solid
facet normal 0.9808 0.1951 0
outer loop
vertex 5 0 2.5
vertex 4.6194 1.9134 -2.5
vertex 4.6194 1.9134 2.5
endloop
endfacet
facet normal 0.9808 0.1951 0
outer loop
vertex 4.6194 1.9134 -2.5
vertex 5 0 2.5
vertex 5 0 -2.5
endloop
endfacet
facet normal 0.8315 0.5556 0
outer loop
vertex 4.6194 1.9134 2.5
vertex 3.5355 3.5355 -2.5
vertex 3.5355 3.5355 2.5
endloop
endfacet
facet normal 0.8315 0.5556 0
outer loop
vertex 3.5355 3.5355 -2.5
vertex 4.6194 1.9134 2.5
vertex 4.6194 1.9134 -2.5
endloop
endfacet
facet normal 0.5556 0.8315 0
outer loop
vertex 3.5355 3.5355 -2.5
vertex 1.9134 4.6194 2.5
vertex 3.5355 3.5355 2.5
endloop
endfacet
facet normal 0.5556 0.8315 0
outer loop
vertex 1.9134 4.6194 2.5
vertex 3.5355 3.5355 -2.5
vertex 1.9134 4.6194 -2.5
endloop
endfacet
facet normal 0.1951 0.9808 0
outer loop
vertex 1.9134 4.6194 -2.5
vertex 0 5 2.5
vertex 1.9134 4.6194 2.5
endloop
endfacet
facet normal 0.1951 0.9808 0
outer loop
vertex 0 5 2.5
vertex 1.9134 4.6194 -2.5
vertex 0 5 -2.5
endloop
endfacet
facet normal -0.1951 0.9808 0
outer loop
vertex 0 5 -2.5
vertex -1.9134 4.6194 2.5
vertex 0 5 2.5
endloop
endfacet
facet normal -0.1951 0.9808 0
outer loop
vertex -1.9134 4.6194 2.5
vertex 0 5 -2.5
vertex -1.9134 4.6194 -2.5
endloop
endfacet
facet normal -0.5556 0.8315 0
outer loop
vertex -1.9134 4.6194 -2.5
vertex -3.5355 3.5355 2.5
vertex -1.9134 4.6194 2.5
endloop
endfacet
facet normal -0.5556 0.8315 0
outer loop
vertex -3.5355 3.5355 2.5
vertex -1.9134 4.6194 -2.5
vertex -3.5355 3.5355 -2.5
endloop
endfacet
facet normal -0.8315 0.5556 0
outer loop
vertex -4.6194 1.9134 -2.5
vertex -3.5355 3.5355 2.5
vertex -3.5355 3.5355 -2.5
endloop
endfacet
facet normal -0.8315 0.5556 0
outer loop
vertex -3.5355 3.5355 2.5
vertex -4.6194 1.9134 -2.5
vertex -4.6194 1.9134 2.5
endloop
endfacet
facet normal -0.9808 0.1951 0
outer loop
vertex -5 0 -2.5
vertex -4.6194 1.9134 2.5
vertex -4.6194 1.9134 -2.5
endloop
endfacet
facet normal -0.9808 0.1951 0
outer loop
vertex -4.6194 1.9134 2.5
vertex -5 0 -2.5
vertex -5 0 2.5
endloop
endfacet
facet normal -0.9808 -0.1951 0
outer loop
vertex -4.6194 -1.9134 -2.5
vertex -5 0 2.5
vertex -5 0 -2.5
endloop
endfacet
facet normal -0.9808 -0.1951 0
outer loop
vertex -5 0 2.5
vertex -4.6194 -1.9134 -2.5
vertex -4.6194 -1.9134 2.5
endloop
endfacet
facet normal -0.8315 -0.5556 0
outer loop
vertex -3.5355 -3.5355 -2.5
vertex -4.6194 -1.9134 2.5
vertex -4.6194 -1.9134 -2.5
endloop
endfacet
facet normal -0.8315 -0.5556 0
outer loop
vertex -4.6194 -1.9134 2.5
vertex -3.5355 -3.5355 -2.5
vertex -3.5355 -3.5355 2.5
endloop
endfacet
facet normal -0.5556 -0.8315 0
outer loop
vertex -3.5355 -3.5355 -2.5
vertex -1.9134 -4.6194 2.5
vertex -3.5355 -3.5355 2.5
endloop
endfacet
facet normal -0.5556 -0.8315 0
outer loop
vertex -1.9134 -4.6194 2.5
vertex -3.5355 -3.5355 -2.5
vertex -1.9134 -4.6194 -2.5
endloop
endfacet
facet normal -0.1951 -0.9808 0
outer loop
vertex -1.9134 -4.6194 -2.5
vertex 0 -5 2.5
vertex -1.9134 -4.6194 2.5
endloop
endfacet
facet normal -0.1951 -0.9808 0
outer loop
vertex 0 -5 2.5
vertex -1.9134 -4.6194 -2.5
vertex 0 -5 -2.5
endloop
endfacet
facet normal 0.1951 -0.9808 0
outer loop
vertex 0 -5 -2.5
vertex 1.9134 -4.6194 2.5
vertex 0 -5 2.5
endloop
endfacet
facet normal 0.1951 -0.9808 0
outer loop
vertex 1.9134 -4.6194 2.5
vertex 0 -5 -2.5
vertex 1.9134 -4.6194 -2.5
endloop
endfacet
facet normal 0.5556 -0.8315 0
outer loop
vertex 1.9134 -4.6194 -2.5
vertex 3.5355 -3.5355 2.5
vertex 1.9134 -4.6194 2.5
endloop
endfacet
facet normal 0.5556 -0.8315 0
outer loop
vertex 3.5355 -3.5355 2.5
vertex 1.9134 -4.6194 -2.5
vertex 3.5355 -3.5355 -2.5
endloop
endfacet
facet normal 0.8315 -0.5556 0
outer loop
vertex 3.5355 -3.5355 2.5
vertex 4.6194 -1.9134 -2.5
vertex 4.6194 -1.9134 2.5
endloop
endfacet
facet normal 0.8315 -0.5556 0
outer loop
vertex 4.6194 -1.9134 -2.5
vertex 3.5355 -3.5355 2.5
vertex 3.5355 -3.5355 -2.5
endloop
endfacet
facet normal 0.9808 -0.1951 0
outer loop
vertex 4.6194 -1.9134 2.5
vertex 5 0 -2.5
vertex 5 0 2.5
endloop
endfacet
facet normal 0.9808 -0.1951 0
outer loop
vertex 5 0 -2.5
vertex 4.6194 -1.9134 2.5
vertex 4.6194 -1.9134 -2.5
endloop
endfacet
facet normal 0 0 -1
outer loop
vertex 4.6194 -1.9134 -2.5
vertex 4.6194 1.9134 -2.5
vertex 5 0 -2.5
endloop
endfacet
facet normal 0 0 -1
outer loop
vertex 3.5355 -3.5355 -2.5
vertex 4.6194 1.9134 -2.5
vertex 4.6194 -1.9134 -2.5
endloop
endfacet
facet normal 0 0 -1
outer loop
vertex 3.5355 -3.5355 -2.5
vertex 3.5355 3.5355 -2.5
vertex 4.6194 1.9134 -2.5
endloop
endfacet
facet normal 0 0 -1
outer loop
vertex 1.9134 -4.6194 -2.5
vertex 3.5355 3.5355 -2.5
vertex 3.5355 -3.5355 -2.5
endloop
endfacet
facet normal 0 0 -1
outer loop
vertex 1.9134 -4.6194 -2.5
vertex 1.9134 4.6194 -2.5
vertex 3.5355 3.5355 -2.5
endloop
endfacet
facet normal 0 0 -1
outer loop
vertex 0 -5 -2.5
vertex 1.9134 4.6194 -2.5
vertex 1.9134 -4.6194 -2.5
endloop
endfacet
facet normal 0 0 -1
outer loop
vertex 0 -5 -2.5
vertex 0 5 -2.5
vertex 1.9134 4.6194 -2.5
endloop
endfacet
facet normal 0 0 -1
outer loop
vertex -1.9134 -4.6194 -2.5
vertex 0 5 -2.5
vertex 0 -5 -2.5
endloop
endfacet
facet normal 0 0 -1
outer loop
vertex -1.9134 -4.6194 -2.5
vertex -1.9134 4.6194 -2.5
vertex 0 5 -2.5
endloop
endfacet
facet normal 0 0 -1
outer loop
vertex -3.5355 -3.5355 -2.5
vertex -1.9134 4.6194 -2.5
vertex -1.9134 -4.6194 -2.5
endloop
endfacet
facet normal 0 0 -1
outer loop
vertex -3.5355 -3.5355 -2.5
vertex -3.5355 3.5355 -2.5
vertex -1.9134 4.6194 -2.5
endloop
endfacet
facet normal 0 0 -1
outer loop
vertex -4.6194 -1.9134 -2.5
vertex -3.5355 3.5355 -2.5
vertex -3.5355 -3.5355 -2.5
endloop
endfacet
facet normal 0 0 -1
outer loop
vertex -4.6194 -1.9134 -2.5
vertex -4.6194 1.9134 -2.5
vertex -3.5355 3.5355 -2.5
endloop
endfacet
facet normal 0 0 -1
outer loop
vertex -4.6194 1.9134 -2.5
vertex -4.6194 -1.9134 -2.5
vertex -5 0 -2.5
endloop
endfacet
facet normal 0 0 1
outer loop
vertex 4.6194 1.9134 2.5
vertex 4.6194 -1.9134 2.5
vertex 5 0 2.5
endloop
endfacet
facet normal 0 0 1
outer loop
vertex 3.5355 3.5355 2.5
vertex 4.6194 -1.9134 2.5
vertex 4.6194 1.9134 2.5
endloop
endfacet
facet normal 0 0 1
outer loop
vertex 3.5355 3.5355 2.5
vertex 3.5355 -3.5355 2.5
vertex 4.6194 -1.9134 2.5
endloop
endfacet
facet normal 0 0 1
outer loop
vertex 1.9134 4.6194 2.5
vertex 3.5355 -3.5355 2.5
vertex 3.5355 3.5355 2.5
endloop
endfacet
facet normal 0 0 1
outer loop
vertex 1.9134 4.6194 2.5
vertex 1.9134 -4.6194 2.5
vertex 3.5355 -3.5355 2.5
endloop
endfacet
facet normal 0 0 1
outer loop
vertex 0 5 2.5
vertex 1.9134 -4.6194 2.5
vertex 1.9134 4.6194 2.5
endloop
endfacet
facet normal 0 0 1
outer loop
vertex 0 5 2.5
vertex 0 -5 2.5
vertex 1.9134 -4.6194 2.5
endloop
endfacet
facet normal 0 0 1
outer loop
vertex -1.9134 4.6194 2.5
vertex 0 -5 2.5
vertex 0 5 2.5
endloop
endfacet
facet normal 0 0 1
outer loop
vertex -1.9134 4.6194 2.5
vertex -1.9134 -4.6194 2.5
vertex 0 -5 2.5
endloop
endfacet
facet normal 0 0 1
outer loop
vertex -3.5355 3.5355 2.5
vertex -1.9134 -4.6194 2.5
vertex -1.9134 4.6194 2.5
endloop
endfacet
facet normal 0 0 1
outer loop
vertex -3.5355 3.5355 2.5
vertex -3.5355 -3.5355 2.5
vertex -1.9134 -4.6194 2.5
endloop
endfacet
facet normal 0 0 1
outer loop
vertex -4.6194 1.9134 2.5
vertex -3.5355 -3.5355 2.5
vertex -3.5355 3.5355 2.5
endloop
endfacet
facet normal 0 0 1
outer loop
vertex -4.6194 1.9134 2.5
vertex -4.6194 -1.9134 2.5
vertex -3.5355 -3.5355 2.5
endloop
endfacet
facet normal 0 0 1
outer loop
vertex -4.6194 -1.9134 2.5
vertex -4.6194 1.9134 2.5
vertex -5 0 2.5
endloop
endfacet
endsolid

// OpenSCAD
//Boolean tutorial: Booleans are about as complex as you ever need to get in openSCAD and honestly I doubt we'll need them for the project. But just in case we do, here is how you do it.

//declare your module, naming the boolean in the arguments
module circlesquare(Circle=true)
{
//declare if statement, = denotes setting something to equal something else, == denotes asking if something equals something else
	if(Circle==true)
	{
//put your argument for a true statement inside the true part
		cylinder(h=5,r=5, center=true);
		//(all center=true does is center the shape on the origin)
	}
	else
	{
//put your argument for a false statement inside the else part
		cube([5,5,5],center=true);
	}
}

//that's it! try toggling this from true to false
circlesquare(true);
